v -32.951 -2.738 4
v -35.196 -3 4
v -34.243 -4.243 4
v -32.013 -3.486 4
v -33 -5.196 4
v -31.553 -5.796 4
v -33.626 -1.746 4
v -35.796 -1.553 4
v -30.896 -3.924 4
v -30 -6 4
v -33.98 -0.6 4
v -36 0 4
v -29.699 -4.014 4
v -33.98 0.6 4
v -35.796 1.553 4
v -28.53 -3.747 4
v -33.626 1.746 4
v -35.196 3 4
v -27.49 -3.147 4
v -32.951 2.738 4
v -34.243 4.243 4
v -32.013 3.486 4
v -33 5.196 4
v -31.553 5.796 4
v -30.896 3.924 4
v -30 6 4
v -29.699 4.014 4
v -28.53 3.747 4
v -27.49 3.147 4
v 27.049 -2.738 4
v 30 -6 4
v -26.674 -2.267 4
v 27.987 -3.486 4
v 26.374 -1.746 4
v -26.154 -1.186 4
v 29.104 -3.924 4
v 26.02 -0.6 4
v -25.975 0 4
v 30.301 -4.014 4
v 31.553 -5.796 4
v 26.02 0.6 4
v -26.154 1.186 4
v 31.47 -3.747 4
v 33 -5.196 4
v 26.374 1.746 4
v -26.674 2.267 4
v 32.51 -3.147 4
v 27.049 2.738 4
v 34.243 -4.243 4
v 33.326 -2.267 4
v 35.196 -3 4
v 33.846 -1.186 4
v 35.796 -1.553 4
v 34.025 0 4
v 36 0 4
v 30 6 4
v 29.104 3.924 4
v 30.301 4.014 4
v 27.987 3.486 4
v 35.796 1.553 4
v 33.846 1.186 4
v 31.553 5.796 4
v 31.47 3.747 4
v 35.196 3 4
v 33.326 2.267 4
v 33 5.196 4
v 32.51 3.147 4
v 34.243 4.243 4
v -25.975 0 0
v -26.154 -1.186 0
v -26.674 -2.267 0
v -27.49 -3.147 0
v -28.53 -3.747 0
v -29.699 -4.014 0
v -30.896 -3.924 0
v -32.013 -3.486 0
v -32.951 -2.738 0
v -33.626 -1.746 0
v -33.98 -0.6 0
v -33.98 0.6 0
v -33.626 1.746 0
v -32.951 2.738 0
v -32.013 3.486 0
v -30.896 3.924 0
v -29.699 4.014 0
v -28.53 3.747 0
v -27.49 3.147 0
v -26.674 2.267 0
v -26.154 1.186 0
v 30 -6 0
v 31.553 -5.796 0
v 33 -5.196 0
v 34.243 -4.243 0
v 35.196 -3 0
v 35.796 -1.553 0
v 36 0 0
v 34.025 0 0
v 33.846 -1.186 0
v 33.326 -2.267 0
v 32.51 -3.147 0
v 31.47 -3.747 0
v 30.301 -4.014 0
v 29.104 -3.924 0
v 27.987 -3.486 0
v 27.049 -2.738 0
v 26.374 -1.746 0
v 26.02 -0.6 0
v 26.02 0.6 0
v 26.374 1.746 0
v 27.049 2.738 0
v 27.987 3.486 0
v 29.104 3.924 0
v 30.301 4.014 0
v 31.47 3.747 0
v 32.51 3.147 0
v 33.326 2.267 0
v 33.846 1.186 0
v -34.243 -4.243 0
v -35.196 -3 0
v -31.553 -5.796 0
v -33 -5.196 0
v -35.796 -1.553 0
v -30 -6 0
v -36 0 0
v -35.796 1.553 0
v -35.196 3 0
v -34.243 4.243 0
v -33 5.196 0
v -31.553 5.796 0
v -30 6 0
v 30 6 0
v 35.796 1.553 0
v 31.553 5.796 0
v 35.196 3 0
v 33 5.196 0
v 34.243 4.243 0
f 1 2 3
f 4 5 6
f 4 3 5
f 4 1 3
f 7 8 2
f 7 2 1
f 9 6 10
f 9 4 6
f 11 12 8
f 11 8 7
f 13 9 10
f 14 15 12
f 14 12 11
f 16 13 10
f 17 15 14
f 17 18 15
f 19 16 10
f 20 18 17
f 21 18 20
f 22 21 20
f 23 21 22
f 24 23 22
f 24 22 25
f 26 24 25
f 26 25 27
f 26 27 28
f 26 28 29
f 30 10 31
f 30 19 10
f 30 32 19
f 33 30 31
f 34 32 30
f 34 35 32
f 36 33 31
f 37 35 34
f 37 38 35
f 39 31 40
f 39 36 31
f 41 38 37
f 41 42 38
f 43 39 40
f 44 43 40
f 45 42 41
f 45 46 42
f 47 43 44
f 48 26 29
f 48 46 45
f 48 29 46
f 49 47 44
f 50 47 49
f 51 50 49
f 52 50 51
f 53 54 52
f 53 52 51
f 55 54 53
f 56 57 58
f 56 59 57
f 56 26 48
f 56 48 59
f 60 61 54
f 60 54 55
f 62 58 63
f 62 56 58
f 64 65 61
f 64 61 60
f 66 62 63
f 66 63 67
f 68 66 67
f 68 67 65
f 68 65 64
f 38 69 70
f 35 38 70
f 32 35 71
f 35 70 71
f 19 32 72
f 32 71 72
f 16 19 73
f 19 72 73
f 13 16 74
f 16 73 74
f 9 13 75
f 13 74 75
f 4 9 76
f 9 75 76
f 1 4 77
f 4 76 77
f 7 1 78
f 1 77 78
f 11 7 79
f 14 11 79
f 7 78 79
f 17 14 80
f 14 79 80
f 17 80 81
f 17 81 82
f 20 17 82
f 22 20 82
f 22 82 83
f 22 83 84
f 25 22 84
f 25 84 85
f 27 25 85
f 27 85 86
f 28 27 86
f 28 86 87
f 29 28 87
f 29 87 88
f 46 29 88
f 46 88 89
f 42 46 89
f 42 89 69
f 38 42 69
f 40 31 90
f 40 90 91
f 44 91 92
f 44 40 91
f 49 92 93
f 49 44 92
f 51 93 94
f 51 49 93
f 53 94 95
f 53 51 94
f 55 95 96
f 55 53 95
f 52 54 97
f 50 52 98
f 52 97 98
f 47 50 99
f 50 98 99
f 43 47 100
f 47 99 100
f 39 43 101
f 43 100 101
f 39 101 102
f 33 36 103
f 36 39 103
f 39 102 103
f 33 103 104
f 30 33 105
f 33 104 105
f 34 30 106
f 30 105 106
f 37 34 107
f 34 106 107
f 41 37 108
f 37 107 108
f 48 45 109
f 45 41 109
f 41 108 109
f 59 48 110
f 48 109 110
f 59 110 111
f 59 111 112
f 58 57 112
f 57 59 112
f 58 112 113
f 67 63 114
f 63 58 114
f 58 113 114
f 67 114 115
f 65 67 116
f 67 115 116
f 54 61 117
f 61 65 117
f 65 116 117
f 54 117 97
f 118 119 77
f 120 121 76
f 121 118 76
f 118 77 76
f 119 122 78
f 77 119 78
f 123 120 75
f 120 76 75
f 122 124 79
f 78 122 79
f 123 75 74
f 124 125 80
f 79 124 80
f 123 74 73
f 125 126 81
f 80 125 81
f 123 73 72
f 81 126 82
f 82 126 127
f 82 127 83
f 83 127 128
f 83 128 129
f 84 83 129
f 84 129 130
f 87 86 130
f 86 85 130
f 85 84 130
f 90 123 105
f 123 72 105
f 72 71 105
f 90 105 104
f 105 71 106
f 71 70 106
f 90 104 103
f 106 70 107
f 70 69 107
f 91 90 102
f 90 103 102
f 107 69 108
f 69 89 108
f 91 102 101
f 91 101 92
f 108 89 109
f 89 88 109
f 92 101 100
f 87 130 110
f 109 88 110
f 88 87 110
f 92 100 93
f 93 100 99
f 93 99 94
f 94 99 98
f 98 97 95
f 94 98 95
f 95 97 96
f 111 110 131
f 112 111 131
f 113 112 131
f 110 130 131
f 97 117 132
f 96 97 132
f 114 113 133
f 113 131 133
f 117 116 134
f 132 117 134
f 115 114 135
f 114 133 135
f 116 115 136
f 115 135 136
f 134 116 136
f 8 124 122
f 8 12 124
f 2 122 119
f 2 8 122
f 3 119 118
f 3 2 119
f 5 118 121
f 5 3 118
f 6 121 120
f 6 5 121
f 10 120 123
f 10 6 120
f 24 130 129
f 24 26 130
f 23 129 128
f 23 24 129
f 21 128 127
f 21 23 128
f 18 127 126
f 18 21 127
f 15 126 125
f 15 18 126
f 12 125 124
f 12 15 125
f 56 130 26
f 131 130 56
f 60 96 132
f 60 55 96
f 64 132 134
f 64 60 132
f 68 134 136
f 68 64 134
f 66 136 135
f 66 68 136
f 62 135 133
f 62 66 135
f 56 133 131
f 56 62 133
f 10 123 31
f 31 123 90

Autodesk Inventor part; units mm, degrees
ref_plane "YZ Plane" through (0, 0, 0) normal (1, 0, 0) x (0, 1, 0)
ref_plane "XZ Plane" through (0, 0, 0) normal (0, 1, 0) x (-1, 0, 0)
ref_plane "XY Plane" through (0, 0, 0) normal (0, 0, 1) x (1, 0, 0)
sketch "스케치1" plane through (0, 0, 0) normal (0, 0, 1) x (1, 0, 0)
  line L0 (0, 0) -> (-36, 0)
  line L1 (0, 0) -> (36, 0) construction
  line L2 (-36, 0) -> (-36, 6)
  line L3 (-36, 0) -> (-36, -6)
  line L4 (-36, 0) -> (-30, 0) construction
  line L5 (0, 0) -> (36, 0)
  line L6 (0, 0) -> (36, 0) construction
  line L7 (36, 0) -> (36, 6)
  line L8 (36, 0) -> (36, -6)
  line L9 (36, 0) -> (42, 0) construction
  line L10 (-36, -6) -> (36, -6)
  line L11 (-36, 6) -> (36, 6)
  circle A0 centre (-30, 0) radius 4.025
  circle A1 centre (30, 0) radius 4.025
  dimension "d0" = 36
  dimension "d1" = 180
  dimension "d2" = 6
  dimension "d3" = 90
  dimension "d4" = 6
  dimension "d5" = 90
  dimension "d6" = 0
  dimension "d7" = 36
  dimension "d8" = 6
  dimension "d9" = 6
  dimension "d10" = 90
  dimension "d11" = 8.05
  dimension "d12" = 8.05
  dimension "d13" = 6
  dimension "d14" = 6
  dimension "d15" = 30
  dimension "d16" = 30
extrude "돌출1" add sketch "스케치1" along normal blind 4 contours L5 A1 L8 L10 L3 L0 A0 | L0 A0 L2 L11 L7 L5 A1
fillet "모깎기1" radius 6 2 edges at (36, -6, 2) (36, 6, 2)
fillet "모깎기2" radius 6 2 edges at (-36, -6, 2) (-36, 6, 2)
sketch "스케치4" plane through (0, 0, 0) normal (0, 0, -1) x (-1, 0, 0)
  circle A0 centre (30, 0) radius 4.025 projected
  circle A1 centre (30, 0) radius 4.8
  point P0 (0, 0)
  dimension "d27" = 9.6
sketch "스케치5" plane through (0, 0, 0) normal (0, 0, -1) x (-1, 0, 0)
  circle A0 centre (30, 0) radius 4.8 projected
  arc A1 (30, -6) -> (30, 6) centre (30, 0) ccw projected
  line L0 (30, 6) -> (-30, 6) projected
  arc A2 (-30, 6) -> (-30, -6) centre (-30, 0) ccw projected
  line L1 (-30, -6) -> (30, -6) projected
  circle A3 centre (-30, 0) radius 4.035 projected
  circle A4 centre (-30, 0) radius 4.8
  point P0 (0, 0)
properties part number "Link" material "알루미늄 6061"
